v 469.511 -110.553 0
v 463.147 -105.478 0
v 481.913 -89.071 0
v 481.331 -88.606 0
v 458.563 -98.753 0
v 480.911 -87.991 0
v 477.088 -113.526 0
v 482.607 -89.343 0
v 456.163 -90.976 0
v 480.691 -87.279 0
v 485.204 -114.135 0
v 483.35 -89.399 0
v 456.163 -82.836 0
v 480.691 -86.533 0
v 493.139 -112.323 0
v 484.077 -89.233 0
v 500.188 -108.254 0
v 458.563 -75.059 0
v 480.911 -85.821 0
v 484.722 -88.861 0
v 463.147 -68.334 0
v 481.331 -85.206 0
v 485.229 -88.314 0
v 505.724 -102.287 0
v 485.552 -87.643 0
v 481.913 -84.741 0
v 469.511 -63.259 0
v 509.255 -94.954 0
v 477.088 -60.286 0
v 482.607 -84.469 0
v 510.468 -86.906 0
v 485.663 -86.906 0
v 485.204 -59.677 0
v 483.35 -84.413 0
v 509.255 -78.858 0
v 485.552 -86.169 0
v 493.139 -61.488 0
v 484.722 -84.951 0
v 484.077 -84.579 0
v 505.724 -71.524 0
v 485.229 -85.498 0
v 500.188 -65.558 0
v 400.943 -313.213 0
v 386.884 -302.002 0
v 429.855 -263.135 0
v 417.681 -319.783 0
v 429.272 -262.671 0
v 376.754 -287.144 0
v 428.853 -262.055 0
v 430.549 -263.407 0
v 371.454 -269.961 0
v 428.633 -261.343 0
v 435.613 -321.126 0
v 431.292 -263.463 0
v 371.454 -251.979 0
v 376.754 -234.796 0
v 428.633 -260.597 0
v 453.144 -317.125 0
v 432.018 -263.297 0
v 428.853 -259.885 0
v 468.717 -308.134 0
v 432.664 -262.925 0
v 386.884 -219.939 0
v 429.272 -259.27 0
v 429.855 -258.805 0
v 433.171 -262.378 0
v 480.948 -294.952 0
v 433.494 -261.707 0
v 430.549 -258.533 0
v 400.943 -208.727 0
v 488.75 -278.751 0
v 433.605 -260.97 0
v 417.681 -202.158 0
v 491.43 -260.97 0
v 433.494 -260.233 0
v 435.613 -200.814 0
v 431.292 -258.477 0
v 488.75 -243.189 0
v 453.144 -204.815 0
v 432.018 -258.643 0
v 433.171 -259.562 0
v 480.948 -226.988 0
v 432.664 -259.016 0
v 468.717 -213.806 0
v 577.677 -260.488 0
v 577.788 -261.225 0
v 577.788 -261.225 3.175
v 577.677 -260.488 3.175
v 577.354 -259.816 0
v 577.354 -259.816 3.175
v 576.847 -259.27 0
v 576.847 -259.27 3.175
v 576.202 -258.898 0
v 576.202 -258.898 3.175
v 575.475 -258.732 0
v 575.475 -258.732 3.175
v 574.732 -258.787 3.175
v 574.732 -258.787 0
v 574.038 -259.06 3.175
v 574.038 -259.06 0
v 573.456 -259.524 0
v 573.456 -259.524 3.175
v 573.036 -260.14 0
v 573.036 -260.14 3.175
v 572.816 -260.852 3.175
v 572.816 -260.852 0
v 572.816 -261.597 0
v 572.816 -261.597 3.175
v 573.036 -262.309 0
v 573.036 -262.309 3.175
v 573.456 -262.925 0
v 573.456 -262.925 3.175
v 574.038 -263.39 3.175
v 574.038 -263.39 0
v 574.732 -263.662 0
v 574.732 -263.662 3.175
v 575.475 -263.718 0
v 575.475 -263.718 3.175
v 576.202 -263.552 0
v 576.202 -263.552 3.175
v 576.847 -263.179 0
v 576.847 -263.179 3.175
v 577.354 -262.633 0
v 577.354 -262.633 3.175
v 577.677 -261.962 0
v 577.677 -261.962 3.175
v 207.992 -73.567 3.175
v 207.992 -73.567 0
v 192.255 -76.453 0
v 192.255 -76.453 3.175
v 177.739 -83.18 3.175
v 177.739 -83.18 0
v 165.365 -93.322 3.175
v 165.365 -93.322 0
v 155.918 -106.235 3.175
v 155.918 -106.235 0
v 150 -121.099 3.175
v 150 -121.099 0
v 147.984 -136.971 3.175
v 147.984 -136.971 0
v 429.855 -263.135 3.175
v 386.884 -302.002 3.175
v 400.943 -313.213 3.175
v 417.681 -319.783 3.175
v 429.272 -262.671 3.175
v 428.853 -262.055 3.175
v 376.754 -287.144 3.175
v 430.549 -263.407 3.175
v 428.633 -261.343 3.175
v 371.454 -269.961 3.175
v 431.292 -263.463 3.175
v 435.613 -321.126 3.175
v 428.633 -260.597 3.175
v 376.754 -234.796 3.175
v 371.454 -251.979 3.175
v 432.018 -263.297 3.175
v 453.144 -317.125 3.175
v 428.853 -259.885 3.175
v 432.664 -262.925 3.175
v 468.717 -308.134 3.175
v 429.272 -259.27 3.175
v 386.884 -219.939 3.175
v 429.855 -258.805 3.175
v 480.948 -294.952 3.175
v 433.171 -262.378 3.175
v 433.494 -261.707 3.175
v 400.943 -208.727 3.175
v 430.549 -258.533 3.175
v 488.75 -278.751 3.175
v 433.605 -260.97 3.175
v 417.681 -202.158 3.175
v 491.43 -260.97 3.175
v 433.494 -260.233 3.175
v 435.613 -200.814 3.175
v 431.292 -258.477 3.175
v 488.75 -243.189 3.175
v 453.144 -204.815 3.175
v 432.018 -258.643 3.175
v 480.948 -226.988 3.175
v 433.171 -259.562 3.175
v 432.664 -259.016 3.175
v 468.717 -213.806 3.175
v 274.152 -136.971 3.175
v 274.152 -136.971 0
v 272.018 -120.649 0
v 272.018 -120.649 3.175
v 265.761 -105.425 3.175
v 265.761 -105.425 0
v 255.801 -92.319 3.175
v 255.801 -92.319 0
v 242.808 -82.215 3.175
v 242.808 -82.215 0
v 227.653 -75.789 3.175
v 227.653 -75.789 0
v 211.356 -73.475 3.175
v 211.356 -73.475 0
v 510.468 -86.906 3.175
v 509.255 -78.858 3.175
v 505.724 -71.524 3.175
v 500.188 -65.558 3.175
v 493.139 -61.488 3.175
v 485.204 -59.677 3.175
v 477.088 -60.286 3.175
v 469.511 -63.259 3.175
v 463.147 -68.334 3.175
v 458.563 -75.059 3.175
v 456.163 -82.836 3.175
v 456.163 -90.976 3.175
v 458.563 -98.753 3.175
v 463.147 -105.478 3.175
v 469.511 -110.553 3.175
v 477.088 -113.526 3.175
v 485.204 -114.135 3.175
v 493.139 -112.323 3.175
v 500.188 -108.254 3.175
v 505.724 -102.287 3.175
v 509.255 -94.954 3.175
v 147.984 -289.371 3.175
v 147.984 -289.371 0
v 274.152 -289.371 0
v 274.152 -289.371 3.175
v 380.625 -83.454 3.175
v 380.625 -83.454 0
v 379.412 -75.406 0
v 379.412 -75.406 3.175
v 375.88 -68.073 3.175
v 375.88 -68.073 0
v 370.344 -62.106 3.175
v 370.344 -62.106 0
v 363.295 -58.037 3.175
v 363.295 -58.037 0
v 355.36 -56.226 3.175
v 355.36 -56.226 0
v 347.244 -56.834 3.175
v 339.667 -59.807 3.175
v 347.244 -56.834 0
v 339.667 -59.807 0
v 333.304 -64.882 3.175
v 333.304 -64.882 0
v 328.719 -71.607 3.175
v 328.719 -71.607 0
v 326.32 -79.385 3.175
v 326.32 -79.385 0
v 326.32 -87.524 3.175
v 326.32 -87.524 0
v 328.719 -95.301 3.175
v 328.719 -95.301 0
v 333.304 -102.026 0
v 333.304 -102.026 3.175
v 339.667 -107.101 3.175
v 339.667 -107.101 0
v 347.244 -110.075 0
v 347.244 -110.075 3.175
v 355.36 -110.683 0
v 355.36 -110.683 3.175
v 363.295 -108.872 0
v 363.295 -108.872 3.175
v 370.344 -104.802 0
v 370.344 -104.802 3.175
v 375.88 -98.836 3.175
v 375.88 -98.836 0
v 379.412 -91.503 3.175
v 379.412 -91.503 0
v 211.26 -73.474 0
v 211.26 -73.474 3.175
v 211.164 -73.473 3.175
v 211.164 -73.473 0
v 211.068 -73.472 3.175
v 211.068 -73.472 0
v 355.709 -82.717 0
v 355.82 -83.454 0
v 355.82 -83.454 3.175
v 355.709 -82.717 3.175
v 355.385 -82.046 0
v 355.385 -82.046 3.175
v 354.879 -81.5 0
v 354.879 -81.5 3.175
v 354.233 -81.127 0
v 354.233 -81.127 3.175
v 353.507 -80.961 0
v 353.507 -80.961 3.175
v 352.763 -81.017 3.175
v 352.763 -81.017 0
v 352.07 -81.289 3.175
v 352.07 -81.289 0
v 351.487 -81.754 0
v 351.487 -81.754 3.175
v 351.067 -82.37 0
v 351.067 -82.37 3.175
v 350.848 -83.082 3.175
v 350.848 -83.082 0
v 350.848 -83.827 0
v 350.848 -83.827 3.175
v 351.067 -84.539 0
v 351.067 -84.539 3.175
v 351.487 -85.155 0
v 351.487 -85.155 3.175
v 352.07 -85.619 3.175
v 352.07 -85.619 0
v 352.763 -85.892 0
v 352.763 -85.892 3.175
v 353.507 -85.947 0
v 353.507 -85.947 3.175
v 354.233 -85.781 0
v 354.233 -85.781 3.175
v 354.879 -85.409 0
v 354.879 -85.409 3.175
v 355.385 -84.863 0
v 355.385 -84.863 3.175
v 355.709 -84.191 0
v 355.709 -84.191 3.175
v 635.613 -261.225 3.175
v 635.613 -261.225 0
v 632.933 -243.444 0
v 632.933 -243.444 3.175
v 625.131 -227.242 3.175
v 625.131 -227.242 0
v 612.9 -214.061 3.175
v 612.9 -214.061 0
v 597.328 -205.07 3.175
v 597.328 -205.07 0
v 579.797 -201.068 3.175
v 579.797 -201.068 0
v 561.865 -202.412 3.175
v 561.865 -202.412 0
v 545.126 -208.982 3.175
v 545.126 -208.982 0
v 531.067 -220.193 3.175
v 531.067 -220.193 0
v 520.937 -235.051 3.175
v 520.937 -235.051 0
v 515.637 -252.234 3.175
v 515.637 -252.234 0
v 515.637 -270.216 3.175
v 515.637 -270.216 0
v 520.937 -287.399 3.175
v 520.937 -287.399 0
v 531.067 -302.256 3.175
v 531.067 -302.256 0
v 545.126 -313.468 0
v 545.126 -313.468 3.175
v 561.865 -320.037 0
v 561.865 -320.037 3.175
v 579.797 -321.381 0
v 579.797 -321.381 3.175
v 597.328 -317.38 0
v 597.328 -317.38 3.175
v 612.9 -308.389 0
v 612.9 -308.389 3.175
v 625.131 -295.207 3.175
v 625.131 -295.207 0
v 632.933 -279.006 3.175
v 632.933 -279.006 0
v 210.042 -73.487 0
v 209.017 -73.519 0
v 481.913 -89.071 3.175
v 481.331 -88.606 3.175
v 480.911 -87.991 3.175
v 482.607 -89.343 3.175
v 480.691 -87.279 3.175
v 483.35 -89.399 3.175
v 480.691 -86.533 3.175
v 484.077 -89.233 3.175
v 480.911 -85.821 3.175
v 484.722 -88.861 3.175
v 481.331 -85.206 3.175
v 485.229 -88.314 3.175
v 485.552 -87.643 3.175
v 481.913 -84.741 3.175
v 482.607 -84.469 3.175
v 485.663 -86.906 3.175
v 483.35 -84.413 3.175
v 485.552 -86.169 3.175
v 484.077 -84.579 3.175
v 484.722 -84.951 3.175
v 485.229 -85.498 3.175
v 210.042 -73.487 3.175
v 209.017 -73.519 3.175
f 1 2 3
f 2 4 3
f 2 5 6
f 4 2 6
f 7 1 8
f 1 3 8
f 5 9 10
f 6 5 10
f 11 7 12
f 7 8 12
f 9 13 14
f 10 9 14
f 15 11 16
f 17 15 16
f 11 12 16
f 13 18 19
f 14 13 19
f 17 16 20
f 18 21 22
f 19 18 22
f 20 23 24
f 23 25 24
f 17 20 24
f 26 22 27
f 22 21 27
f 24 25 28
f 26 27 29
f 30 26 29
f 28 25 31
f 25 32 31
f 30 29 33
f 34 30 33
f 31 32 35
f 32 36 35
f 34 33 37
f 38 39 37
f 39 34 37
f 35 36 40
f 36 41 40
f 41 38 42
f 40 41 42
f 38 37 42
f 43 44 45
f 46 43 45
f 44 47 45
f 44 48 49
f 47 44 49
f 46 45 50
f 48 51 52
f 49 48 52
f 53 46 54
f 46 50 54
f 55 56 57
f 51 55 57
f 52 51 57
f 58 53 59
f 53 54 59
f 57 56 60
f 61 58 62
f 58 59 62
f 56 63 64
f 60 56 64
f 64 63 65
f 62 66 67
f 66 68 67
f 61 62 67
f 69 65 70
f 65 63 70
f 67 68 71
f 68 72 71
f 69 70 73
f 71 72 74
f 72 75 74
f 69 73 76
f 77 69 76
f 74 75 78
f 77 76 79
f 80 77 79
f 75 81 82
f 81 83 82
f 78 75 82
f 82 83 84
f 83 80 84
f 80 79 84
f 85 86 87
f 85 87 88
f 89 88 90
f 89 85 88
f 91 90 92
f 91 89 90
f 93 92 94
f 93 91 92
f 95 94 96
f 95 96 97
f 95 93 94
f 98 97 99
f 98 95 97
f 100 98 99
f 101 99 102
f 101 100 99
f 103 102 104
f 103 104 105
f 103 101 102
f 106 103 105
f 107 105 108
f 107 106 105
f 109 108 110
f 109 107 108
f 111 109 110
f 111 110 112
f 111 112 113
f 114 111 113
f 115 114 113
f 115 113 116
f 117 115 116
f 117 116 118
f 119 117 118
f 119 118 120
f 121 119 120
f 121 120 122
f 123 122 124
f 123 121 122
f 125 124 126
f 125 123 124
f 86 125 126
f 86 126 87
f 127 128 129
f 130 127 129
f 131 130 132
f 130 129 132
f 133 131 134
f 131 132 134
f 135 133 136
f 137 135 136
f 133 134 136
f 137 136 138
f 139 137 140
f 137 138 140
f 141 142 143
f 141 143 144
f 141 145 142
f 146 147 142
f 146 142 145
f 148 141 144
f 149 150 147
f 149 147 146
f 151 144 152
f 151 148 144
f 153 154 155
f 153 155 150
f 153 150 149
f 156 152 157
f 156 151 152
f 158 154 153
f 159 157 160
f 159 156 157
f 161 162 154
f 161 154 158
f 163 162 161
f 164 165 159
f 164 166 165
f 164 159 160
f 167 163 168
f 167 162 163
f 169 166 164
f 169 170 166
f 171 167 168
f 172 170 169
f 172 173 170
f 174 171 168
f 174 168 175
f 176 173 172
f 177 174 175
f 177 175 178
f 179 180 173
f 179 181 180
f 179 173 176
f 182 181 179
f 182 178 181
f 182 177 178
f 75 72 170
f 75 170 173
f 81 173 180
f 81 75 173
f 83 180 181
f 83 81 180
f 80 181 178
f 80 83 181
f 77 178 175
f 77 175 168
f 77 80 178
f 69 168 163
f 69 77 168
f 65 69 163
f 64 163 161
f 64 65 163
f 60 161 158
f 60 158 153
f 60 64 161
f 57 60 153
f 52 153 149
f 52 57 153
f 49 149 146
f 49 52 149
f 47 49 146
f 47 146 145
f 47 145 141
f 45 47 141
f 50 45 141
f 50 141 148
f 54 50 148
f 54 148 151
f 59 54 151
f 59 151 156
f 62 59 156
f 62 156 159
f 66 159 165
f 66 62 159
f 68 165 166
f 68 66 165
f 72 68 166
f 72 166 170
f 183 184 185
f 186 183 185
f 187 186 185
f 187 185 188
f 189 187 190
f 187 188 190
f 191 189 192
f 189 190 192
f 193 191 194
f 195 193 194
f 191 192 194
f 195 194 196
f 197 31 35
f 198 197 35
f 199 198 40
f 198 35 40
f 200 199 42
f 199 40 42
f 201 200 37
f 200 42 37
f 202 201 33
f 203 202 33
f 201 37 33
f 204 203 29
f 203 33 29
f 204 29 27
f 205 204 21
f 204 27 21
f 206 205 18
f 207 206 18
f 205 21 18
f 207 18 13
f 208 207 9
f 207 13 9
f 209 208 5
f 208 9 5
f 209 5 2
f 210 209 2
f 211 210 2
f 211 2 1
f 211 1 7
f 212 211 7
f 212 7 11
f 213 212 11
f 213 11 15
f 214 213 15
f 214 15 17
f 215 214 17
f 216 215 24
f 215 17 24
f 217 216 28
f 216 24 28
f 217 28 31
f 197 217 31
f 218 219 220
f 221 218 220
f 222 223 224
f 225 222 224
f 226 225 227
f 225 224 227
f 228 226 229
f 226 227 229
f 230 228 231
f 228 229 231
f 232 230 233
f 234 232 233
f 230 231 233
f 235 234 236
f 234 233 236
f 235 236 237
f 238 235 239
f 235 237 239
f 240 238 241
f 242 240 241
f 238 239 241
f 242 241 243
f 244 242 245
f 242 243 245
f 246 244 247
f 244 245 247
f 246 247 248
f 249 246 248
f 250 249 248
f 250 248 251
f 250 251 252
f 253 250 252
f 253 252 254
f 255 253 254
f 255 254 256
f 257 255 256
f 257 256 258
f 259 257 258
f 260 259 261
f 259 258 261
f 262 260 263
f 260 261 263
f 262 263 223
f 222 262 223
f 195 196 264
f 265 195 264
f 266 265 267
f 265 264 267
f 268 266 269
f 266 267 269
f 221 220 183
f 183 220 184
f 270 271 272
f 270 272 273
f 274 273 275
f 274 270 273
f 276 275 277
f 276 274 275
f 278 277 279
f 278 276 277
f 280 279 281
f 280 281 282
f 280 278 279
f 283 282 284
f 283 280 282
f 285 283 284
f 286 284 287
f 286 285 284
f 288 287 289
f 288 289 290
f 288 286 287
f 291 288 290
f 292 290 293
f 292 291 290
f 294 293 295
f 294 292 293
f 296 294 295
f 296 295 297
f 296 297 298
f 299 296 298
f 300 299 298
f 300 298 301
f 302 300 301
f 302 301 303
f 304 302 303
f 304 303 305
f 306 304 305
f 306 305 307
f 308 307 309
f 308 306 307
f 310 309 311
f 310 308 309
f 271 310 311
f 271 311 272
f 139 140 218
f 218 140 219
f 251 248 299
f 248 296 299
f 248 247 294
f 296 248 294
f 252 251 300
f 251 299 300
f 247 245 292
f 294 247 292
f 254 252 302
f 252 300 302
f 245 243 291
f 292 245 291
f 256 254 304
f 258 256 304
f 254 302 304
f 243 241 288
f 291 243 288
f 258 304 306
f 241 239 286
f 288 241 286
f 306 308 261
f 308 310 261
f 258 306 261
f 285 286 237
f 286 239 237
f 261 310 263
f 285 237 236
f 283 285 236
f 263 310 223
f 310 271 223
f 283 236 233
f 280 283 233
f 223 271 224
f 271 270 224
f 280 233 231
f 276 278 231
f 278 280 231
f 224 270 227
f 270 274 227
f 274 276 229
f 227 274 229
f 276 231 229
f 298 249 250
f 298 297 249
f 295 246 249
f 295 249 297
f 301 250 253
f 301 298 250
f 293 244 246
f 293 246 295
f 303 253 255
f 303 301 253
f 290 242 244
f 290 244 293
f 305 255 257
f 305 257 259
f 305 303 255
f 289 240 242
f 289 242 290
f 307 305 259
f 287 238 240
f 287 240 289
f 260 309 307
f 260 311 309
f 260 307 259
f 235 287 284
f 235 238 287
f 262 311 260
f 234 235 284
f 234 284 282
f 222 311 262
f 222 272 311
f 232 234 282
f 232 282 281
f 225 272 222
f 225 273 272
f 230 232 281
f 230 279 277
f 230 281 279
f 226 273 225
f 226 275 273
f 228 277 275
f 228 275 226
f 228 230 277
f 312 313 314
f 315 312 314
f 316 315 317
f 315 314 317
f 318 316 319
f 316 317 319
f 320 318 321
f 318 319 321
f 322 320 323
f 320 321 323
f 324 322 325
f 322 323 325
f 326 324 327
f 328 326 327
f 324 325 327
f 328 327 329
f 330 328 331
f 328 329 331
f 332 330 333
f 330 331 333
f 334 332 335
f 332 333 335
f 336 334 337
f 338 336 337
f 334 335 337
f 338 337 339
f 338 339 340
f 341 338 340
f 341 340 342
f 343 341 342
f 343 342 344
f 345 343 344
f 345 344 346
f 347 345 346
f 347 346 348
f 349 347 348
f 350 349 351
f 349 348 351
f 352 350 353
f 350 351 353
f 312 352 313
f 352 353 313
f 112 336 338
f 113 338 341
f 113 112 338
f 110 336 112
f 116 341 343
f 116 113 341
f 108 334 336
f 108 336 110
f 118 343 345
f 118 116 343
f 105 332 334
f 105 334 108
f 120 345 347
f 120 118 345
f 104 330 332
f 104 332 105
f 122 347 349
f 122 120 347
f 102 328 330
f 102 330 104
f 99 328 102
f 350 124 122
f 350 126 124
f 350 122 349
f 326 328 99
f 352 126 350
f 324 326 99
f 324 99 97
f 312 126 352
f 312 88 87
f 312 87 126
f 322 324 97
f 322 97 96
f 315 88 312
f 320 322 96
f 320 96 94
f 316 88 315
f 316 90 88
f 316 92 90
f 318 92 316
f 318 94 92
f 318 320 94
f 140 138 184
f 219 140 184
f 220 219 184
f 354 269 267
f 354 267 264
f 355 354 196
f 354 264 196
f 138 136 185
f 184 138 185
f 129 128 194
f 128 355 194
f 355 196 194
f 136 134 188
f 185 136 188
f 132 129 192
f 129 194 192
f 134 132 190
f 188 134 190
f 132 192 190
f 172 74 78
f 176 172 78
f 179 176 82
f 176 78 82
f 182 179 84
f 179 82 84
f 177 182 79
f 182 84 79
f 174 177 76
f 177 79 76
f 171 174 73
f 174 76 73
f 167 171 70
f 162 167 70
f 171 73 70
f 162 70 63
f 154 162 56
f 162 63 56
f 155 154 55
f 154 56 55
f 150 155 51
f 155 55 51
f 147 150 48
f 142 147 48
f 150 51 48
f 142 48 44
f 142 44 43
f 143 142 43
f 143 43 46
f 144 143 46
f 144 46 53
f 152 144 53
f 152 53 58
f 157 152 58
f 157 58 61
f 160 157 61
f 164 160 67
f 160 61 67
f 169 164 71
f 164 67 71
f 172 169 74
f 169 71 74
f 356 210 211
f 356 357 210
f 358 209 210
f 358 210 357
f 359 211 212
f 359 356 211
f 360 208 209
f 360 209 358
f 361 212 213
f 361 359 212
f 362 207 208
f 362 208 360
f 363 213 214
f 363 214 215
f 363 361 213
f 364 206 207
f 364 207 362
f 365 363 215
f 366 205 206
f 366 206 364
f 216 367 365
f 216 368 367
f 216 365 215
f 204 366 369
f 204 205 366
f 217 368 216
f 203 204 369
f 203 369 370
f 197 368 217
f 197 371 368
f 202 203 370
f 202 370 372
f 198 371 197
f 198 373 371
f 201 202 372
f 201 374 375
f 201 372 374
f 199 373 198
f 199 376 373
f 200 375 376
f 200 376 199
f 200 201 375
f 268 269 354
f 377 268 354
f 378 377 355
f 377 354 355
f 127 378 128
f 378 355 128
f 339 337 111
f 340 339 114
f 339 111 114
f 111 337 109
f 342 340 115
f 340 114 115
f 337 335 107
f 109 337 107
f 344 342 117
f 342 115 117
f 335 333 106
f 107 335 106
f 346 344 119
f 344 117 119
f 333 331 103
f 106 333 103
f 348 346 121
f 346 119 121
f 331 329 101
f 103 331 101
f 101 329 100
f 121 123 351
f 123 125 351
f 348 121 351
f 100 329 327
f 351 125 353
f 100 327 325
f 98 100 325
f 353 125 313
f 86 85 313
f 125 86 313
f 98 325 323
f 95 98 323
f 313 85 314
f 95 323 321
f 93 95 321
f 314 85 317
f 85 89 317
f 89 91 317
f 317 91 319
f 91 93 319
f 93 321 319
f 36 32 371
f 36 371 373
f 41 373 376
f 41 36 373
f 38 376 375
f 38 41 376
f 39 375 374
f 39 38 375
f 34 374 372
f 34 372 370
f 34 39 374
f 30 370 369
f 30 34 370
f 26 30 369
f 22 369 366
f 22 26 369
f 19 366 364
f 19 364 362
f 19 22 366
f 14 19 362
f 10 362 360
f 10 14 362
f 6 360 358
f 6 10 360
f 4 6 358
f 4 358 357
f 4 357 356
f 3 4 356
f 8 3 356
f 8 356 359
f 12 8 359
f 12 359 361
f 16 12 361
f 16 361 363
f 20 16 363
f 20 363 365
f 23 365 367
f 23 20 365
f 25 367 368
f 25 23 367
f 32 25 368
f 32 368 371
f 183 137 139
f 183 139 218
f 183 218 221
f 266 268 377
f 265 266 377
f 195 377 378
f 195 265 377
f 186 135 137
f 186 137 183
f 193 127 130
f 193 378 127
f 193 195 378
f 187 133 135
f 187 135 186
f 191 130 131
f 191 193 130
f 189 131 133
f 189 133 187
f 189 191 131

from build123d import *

# Parameters (mm, degrees)
F0_R     = 60.325
F0_R_2   = 2.5
F0_R_3   = 27.305
F1_DEPTH = 3.175


with BuildPart() as f1:
    # F0 (on Top) → F1 (new body)
    with BuildSketch(Plane.XY):
        with Locations((431.105014, -260.970086)):
            Circle(F0_R)
        with Locations((431.105014, -260.970086)):
            Circle(F0_R_2, mode=Mode.SUBTRACT)
        with Locations((575.288415, -261.224717)):
            Circle(F0_R)
        with Locations((575.288415, -261.224717)):
            Circle(F0_R_2, mode=Mode.SUBTRACT)
        with Locations((483.163476, -86.905949)):
            Circle(F0_R_3)
        with Locations((483.163476, -86.905949)):
            Circle(F0_R_2, mode=Mode.SUBTRACT)
        with BuildLine():
            ThreePointArc((207.991694, -73.567072), (165.364655, -93.321922), (147.984194, -136.970956))
            Line((147.984194, -136.970956), (147.984194, -289.370956))
            Line((147.984194, -289.370956), (274.151789, -289.370956))
            Line((274.151789, -289.370956), (274.151789, -136.970956))
            ThreePointArc((274.151789, -136.970956), (255.801452, -92.319439), (211.356264, -73.474863))
            ThreePointArc((211.356264, -73.474863), (211.212129, -73.473428), (211.067992, -73.472319))
            ThreePointArc((211.067992, -73.472319), (209.529269, -73.501055), (207.991694, -73.567072))
        make_face()
        with Locations((353.319794, -83.454296)):
            Circle(F0_R_3)
        with Locations((353.319794, -83.454296)):
            Circle(F0_R_2, mode=Mode.SUBTRACT)
    extrude(amount=F1_DEPTH)


solid = f1.part
